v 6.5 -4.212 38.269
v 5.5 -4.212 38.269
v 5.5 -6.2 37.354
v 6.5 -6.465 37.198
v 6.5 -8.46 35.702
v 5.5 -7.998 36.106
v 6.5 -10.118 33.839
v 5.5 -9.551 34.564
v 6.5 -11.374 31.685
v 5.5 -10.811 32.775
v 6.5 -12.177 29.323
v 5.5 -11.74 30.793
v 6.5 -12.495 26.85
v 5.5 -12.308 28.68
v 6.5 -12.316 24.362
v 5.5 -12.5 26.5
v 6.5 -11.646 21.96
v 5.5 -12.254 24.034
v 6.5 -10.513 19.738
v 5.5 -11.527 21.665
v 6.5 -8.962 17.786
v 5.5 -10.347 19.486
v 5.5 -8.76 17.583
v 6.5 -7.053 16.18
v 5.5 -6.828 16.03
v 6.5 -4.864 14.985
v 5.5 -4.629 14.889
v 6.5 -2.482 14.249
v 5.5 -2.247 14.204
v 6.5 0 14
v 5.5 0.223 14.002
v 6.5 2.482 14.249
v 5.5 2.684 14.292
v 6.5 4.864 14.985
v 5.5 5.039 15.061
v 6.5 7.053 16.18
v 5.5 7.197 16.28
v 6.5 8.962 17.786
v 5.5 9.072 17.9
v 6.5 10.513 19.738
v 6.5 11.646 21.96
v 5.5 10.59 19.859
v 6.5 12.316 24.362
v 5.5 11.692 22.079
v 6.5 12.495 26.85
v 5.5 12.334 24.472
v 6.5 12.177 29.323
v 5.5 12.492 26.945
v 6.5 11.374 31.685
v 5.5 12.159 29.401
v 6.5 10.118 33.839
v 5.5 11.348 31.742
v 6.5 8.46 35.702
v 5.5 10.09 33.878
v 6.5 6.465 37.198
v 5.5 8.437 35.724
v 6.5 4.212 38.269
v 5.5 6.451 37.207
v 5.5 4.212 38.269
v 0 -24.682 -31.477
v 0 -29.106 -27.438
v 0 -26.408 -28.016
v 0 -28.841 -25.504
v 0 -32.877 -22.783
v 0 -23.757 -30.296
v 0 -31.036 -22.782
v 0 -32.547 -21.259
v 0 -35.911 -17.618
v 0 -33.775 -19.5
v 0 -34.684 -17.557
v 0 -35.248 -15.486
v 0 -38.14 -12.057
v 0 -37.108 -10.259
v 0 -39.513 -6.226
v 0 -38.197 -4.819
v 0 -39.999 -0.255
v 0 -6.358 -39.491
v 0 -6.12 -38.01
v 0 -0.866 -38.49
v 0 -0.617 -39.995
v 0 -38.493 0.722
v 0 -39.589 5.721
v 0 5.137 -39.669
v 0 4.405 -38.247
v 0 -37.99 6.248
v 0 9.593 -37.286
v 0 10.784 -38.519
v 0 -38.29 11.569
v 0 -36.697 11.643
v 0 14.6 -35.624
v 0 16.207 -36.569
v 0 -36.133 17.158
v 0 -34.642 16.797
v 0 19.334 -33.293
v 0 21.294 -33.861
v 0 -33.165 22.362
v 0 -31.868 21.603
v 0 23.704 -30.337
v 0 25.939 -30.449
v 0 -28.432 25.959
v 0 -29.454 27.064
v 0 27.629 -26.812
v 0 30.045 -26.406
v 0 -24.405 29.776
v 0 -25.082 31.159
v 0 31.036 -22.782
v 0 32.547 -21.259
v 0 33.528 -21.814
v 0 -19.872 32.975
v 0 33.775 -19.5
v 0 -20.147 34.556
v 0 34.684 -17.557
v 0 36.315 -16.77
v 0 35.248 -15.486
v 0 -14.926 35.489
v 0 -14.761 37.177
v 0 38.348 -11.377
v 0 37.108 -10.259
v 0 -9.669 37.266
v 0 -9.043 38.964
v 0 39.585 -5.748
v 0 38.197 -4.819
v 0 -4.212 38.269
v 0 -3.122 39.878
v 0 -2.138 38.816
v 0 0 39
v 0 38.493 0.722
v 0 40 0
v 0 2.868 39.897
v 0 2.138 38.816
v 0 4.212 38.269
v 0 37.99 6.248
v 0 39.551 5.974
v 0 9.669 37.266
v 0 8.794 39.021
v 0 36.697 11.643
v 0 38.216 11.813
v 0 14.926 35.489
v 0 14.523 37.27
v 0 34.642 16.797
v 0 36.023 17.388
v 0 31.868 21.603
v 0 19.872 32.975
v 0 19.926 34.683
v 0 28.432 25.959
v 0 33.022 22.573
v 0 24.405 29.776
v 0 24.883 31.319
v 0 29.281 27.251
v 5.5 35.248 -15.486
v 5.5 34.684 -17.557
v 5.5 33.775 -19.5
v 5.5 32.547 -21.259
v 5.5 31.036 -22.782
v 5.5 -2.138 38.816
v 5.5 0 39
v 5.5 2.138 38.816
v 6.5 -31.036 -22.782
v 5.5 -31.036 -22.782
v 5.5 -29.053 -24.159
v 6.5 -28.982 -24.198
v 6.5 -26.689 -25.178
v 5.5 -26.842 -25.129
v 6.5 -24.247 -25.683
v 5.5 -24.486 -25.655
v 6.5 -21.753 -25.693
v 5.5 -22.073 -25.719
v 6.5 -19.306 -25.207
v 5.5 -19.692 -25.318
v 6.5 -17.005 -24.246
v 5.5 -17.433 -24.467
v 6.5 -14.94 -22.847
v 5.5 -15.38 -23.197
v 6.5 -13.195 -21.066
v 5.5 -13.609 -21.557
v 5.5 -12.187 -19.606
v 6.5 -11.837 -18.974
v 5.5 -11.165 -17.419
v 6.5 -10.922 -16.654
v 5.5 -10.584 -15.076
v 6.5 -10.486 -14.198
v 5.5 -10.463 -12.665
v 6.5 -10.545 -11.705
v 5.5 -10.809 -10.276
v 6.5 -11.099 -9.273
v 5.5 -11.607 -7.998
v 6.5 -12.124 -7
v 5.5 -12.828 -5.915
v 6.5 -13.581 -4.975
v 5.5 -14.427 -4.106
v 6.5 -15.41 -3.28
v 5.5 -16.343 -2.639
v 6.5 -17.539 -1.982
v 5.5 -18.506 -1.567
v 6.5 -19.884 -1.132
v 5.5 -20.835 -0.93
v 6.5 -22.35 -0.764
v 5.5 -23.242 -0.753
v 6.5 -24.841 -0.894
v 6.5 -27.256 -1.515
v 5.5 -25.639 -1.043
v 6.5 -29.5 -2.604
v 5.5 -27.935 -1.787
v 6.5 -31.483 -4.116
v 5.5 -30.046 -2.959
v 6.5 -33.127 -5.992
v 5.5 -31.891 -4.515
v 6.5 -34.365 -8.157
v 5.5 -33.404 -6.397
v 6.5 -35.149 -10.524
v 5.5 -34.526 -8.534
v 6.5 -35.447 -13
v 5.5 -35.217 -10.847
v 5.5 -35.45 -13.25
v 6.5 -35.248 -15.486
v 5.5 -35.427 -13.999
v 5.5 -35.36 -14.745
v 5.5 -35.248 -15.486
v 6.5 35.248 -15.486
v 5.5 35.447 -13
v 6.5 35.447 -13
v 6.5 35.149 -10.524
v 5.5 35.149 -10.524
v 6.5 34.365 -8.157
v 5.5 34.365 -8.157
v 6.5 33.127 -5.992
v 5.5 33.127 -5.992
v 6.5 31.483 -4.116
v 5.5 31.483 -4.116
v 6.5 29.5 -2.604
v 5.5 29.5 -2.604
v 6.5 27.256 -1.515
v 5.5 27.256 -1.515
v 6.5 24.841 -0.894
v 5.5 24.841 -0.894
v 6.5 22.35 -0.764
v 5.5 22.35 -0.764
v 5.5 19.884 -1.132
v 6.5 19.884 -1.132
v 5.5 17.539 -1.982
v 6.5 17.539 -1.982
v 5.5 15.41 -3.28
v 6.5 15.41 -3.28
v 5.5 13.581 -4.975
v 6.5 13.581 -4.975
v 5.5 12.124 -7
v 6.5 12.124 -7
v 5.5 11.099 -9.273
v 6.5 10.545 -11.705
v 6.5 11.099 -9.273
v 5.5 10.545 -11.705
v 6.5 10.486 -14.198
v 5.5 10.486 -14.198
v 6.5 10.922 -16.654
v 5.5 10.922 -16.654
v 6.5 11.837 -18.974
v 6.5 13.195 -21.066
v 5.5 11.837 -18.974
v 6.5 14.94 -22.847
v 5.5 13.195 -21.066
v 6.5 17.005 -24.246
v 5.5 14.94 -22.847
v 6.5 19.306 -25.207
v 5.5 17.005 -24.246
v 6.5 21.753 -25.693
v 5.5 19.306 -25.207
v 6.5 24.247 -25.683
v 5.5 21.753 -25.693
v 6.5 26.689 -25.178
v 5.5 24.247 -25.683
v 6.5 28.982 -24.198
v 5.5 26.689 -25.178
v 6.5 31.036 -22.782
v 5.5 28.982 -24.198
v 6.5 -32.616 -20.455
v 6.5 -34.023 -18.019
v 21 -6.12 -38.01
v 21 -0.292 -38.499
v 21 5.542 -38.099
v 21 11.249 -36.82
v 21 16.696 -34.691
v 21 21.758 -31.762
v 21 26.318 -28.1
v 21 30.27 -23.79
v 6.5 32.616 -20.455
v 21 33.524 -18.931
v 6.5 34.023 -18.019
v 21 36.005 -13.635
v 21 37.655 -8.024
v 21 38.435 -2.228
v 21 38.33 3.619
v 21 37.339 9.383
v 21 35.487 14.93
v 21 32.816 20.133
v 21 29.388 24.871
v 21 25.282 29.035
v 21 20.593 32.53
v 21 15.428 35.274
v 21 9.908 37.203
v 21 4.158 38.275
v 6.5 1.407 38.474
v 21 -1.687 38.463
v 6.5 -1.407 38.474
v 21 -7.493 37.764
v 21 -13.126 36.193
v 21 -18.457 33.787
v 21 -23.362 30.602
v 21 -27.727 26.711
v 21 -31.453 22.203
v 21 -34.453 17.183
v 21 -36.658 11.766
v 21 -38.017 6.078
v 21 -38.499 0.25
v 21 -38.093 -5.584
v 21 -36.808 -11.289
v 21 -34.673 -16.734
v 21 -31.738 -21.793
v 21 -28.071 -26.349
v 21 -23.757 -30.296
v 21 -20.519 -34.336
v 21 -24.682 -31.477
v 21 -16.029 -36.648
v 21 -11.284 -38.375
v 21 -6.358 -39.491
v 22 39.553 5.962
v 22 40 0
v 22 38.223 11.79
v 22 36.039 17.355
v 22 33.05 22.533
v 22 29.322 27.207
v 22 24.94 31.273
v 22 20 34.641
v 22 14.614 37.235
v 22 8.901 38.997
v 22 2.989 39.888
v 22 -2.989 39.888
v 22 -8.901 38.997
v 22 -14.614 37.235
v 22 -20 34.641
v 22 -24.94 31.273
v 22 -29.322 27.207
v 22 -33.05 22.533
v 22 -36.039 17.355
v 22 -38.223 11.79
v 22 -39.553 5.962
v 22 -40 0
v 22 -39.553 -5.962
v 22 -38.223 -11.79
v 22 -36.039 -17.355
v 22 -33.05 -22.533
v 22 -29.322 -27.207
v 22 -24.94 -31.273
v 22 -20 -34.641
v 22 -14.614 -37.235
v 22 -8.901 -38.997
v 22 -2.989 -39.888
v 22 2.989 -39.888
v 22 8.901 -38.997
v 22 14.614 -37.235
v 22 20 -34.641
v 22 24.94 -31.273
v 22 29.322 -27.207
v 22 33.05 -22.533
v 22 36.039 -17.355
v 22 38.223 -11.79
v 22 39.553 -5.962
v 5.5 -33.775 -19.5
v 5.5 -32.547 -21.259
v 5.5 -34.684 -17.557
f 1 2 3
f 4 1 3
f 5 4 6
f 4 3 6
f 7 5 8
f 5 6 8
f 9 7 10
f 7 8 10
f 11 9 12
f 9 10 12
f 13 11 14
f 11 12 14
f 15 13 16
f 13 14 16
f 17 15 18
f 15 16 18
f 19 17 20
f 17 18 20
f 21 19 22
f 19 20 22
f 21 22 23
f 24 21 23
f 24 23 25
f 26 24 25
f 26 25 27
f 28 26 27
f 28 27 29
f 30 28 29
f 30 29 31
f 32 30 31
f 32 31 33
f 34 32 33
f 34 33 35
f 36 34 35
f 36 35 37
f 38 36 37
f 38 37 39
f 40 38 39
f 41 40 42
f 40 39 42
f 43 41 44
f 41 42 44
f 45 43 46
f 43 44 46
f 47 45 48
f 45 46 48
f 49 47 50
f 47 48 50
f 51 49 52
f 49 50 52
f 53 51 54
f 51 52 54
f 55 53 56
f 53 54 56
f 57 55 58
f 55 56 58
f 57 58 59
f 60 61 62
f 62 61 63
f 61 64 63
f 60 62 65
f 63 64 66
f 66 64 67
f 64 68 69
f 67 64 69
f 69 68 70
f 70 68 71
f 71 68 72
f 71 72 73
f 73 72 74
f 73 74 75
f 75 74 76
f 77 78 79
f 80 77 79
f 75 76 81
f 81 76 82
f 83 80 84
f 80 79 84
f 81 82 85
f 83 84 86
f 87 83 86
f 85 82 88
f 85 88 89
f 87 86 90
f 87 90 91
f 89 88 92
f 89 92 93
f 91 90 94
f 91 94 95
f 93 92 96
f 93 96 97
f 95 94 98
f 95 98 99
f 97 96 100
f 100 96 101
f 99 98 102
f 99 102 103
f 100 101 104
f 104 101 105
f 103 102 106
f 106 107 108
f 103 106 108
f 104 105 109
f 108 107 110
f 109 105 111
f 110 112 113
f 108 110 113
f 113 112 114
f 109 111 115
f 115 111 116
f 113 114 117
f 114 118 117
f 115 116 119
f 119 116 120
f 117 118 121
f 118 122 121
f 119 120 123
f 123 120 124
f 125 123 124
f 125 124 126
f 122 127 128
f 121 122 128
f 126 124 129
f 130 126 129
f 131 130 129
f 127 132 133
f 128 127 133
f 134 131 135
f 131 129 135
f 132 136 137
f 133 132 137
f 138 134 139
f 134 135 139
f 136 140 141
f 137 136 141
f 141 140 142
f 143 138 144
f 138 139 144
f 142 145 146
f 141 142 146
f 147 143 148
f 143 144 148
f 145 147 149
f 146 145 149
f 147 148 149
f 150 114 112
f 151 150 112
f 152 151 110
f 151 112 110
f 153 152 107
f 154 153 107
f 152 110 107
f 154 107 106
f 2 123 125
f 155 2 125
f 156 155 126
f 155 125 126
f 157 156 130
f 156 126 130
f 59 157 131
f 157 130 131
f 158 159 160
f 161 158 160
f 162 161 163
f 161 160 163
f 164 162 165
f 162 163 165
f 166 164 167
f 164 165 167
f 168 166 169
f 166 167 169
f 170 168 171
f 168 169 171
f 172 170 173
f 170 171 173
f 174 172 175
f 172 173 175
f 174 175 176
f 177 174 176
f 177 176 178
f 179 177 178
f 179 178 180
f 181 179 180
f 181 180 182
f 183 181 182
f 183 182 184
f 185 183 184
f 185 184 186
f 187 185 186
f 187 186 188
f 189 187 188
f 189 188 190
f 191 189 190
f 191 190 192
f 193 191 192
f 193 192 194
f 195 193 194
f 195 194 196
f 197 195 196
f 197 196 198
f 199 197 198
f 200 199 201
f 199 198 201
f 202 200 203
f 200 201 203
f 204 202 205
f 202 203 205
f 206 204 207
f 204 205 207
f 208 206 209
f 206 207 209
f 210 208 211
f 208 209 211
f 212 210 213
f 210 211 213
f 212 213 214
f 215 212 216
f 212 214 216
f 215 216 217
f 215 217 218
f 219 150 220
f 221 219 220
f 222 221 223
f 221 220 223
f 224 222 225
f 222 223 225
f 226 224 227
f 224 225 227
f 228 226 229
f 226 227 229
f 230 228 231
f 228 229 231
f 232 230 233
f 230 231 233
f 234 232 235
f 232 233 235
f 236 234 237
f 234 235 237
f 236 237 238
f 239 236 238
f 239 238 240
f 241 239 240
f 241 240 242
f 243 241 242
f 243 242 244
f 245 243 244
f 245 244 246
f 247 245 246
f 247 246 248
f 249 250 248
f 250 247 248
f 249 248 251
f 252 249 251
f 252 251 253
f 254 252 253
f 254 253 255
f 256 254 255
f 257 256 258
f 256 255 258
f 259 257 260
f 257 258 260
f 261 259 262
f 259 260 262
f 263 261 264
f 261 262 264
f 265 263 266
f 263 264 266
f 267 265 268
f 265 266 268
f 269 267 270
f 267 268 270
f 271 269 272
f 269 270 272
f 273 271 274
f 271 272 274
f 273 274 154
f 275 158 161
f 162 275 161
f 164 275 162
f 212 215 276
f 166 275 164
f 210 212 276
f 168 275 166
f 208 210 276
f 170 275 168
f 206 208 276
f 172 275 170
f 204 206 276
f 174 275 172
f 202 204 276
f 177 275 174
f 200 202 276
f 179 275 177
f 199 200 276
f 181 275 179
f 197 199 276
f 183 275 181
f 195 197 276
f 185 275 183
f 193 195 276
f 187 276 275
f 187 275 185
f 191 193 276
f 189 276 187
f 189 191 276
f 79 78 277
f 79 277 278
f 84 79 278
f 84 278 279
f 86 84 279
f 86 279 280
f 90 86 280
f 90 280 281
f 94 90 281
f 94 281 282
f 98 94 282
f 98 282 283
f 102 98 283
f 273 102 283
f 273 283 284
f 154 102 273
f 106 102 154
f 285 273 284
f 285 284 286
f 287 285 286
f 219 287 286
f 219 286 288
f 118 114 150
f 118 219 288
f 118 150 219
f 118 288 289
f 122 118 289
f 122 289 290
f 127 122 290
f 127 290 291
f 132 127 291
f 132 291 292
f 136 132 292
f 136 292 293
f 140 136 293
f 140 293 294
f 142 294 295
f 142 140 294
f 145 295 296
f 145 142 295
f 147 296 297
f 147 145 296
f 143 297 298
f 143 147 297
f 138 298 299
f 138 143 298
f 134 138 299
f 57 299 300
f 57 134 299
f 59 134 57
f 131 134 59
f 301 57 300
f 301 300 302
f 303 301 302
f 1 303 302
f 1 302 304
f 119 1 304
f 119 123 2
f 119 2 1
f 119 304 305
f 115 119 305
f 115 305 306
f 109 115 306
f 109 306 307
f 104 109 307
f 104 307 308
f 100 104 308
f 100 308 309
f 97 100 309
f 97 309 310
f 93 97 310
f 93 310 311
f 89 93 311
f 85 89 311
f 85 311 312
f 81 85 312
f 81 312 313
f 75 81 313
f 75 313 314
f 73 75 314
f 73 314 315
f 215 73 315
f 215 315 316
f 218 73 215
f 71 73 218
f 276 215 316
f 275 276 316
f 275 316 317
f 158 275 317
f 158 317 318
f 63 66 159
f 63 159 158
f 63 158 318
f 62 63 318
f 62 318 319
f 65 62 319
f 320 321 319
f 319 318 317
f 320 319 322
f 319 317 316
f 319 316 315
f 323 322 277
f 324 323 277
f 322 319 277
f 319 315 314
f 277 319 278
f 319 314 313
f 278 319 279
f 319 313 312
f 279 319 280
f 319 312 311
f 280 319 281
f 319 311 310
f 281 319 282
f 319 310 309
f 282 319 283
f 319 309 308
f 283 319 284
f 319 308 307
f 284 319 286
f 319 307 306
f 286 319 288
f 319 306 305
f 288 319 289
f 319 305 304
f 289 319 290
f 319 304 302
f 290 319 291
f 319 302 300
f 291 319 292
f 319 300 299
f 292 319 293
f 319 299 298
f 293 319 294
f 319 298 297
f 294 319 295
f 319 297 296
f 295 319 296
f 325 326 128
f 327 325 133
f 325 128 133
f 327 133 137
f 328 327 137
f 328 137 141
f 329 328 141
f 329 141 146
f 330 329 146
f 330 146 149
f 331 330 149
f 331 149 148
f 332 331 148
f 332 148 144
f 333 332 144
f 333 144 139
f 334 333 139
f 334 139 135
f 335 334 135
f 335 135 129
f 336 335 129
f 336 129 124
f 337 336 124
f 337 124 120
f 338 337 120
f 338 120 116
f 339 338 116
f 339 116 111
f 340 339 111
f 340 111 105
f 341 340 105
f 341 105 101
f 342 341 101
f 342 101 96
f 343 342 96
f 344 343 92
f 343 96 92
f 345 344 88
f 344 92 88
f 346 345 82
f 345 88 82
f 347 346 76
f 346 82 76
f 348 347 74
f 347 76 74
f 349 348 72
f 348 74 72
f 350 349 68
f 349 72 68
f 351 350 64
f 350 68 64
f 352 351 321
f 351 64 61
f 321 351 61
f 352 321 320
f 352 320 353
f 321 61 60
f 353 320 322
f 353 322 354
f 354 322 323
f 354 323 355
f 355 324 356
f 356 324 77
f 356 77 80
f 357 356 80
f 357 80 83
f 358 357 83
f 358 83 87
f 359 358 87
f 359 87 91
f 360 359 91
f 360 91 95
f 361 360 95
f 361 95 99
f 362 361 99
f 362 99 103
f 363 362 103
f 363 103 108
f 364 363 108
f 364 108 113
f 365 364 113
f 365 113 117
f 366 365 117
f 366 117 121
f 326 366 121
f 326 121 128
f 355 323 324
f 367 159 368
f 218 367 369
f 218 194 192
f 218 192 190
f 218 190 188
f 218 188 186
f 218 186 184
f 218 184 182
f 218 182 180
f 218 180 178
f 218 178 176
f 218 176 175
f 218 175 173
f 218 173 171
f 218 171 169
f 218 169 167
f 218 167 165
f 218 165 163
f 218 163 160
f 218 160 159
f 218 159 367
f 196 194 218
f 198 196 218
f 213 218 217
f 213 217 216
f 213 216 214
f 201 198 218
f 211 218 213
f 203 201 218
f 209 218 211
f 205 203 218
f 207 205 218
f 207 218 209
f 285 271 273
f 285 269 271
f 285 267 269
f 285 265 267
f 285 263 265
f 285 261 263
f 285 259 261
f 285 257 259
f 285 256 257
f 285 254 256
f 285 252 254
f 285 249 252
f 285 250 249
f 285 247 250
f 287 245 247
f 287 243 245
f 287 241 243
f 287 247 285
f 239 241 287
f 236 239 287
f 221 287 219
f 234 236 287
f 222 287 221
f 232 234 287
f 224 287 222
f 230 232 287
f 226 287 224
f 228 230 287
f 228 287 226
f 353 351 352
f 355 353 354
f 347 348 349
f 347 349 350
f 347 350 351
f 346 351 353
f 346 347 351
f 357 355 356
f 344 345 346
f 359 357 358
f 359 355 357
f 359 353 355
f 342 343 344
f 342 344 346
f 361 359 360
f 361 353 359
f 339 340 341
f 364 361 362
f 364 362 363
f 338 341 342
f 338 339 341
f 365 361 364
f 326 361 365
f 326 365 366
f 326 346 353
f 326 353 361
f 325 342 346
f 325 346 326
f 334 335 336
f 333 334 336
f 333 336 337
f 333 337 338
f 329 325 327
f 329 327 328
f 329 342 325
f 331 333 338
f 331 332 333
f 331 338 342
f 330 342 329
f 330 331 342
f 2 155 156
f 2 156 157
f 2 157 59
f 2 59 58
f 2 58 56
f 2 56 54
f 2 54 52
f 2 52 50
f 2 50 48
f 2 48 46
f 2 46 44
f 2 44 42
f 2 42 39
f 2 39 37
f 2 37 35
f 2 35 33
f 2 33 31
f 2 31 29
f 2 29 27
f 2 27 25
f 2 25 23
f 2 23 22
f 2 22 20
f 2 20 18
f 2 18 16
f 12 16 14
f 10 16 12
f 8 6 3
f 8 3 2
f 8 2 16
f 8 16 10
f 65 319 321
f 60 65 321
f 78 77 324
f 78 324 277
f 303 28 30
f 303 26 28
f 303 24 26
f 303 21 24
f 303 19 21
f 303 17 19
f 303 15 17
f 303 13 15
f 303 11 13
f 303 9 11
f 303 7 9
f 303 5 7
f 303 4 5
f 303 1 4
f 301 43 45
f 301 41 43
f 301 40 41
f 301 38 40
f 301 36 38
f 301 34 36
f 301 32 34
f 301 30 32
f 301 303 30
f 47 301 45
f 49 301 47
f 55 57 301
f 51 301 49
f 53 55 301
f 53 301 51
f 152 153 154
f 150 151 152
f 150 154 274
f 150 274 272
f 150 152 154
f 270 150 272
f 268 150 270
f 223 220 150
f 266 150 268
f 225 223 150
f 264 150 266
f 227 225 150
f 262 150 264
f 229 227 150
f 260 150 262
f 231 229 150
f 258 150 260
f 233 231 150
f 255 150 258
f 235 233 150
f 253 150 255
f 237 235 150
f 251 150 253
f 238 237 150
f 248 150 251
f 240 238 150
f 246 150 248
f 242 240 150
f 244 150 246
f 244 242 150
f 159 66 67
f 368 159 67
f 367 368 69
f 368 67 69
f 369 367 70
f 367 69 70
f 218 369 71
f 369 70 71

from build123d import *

# Parameters (mm, degrees)
F0_R     = 40
F1_DEPTH = 22
F2_T     = -1.5
F3_R     = 12.5
F4_DEPTH = 6.5
F6_DEPTH = 20.5
F8_DEPTH = 5.5
F9_DEPTH = 0.5


with BuildPart() as f1:
    # F0 (on Right) → F1 (new body)
    with BuildSketch(Plane.YZ):
        Circle(F0_R)
    extrude(amount=F1_DEPTH)

    # F2
    f2_openings = [f1.faces().sort_by_distance(p)[0] for p in [
        (0, 0, 0),
    ]]
    offset(amount=F2_T, openings=f2_openings)

    # F3 (on Right) → F4 (join)
    with BuildSketch(Plane.YZ):
        with Locations((22.9496732003, -13.25)):
            Circle(F3_R)
        with Locations((0, 26.5)):
            Circle(F3_R)
        with Locations((-22.9496732003, -13.25)):
            Circle(F3_R)
    extrude(amount=F4_DEPTH)

    # F5 (on Right) → F6 (cut)
    with BuildSketch(Plane.YZ):
        with BuildLine():
            Line((-23.7566848809, -30.2963681564), (-24.6822700062, -31.4767461365))
            ThreePointArc((-24.6822700062, -31.4767461365), (-16.029318636, -36.6477958964), (-6.3583720579, -39.4914054545))
            Line((-6.3583720579, -39.4914054545), (-6.1199331058, -38.01047775))
            ThreePointArc((-6.1199331058, -38.01047775), (-15.4282191871, -35.2735035503), (-23.7566848809, -30.2963681564))
        make_face()
    extrude(amount=F6_DEPTH, mode=Mode.SUBTRACT)

    # F7 (on face) → F8 (cut)
    with BuildSketch(Plane(origin=(0, 0, 0), x_dir=(0, -1, 0), z_dir=(-1, 0, 0))):
        with BuildLine():
            ThreePointArc((-10.4496732003, -13.25), (-24.0724348464, -0.8005258631), (-35.247978206, -15.4864467321))
            ThreePointArc((-35.247978206, -15.4864467321), (-33.7749907476, -19.5), (-31.0356453874, -22.7824211924))
            ThreePointArc((-31.0356453874, -22.7824211924), (-17.6972762398, -24.5929416894), (-10.4496732003, -13.25))
        make_face()
        with BuildLine():
            ThreePointArc((31.0356453874, -22.7824211924), (33.7749907476, -19.5), (35.247978206, -15.4864467321))
            ThreePointArc((35.247978206, -15.4864467321), (35.3991473372, -14.3727616462), (35.4496732003, -13.25))
            ThreePointArc((35.4496732003, -13.25), (11.6067315109, -7.9976030395), (31.0356453874, -22.7824211924))
        make_face()
        with BuildLine():
            ThreePointArc((4.2123328186, 38.2688679245), (0, 39), (-4.2123328186, 38.2688679245))
            ThreePointArc((-4.2123328186, 38.2688679245), (-7.1970771764, 16.2798199567), (12.5, 26.5))
            ThreePointArc((12.5, 26.5), (10.2201800433, 33.6970771764), (4.2123328186, 38.2688679245))
        make_face()
    extrude(amount=-F8_DEPTH, mode=Mode.SUBTRACT)

    # F9 (cut): a face of the model
    f9_faces = [f1.faces().sort_by_distance(p)[0] for p in [
        (20.5, -0.0988123254, -0.2259144019),
    ]]
    extrude(f9_faces, amount=-F9_DEPTH, mode=Mode.SUBTRACT)


solid = f1.part
